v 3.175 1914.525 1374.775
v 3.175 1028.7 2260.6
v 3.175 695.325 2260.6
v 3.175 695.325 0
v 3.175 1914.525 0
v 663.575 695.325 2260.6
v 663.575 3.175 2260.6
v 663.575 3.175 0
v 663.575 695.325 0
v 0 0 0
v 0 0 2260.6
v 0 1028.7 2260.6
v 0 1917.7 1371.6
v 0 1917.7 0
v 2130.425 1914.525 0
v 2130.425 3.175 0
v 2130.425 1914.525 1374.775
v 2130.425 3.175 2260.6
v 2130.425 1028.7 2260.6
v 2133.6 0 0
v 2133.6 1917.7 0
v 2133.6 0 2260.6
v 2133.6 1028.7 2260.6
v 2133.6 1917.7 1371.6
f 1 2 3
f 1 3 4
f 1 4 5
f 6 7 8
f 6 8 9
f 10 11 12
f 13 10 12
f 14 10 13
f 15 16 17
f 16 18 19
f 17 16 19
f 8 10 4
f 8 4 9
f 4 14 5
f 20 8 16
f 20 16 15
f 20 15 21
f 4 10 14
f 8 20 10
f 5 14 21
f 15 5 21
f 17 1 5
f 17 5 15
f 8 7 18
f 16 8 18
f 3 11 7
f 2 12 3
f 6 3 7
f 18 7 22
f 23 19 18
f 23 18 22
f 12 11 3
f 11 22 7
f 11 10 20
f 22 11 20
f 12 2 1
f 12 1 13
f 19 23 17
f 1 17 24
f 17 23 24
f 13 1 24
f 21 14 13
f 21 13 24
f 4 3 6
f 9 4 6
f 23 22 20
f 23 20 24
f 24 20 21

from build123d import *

# Parameters (mm, degrees)
F0_W      = 2133.6
F0_H      = 1917.7
F1_DEPTH  = 2260.6
F2_W      = 990.6
F2_H      = 1219.2
F2_W_2    = 1016
F3_DEPTH  = 2260.601
F4_W      = 1346.2
F4_H      = 457.2
F5_DEPTH  = 2260.601
F7_DEPTH  = 2133.601
F8_W      = 1466.85
F8_H      = 234.95
F9_DEPTH  = 2260.601
F10_W     = 120.65
F10_H     = 1219.2
F10_H_2   = 457.2
F11_DEPTH = 2260.601


with BuildPart() as f1:
    # F0 (on Top) → F1 (new body)
    with BuildSketch(Plane.XY):
        with Locations((1066.8, 958.85)):
            Rectangle(F0_W, F0_H)
    extrude(amount=F1_DEPTH)

    # F2 (on face) → F3 (cut, through all)
    with BuildSketch(Plane.XY.offset(2260.6)):
        with Locations((1635.125, 1304.925)):
            Rectangle(F2_W, F2_H)
        with Locations((511.175, 1304.925)):
            Rectangle(F2_W_2, F2_H)
    extrude(amount=-F3_DEPTH, mode=Mode.SUBTRACT)

    # F4 (on face) → F5 (cut, through all)
    with BuildSketch(Plane.XY.offset(2260.6)):
        with Locations((1336.675, 231.775)):
            Rectangle(F4_W, F4_H)
    extrude(amount=-F5_DEPTH, mode=Mode.SUBTRACT)

    # F6 (on face) → F7 (cut, through all)
    with BuildSketch(Plane.YZ.offset(2133.6)):
        Polygon((1917.7, 1371.6), (1917.7, 2260.6), (1028.7, 2260.6), align=None)
    extrude(amount=-F7_DEPTH, mode=Mode.SUBTRACT)

    # F8 (on face) → F9 (cut, through all)
    with BuildSketch(Plane.XY.offset(2260.6)):
        with Locations((1397, 577.85)):
            Rectangle(F8_W, F8_H)
    extrude(amount=-F9_DEPTH, mode=Mode.SUBTRACT)

    # F10 (on face) → F11 (cut, through all)
    with BuildSketch(Plane.XY.offset(2260.6)):
        with Locations((1079.5, 1304.925)):
            Rectangle(F10_W, F10_H)
        with Locations((2070.1, 231.775)):
            Rectangle(F10_W, F10_H_2)
    extrude(amount=-F11_DEPTH, mode=Mode.SUBTRACT)


solid = f1.part
